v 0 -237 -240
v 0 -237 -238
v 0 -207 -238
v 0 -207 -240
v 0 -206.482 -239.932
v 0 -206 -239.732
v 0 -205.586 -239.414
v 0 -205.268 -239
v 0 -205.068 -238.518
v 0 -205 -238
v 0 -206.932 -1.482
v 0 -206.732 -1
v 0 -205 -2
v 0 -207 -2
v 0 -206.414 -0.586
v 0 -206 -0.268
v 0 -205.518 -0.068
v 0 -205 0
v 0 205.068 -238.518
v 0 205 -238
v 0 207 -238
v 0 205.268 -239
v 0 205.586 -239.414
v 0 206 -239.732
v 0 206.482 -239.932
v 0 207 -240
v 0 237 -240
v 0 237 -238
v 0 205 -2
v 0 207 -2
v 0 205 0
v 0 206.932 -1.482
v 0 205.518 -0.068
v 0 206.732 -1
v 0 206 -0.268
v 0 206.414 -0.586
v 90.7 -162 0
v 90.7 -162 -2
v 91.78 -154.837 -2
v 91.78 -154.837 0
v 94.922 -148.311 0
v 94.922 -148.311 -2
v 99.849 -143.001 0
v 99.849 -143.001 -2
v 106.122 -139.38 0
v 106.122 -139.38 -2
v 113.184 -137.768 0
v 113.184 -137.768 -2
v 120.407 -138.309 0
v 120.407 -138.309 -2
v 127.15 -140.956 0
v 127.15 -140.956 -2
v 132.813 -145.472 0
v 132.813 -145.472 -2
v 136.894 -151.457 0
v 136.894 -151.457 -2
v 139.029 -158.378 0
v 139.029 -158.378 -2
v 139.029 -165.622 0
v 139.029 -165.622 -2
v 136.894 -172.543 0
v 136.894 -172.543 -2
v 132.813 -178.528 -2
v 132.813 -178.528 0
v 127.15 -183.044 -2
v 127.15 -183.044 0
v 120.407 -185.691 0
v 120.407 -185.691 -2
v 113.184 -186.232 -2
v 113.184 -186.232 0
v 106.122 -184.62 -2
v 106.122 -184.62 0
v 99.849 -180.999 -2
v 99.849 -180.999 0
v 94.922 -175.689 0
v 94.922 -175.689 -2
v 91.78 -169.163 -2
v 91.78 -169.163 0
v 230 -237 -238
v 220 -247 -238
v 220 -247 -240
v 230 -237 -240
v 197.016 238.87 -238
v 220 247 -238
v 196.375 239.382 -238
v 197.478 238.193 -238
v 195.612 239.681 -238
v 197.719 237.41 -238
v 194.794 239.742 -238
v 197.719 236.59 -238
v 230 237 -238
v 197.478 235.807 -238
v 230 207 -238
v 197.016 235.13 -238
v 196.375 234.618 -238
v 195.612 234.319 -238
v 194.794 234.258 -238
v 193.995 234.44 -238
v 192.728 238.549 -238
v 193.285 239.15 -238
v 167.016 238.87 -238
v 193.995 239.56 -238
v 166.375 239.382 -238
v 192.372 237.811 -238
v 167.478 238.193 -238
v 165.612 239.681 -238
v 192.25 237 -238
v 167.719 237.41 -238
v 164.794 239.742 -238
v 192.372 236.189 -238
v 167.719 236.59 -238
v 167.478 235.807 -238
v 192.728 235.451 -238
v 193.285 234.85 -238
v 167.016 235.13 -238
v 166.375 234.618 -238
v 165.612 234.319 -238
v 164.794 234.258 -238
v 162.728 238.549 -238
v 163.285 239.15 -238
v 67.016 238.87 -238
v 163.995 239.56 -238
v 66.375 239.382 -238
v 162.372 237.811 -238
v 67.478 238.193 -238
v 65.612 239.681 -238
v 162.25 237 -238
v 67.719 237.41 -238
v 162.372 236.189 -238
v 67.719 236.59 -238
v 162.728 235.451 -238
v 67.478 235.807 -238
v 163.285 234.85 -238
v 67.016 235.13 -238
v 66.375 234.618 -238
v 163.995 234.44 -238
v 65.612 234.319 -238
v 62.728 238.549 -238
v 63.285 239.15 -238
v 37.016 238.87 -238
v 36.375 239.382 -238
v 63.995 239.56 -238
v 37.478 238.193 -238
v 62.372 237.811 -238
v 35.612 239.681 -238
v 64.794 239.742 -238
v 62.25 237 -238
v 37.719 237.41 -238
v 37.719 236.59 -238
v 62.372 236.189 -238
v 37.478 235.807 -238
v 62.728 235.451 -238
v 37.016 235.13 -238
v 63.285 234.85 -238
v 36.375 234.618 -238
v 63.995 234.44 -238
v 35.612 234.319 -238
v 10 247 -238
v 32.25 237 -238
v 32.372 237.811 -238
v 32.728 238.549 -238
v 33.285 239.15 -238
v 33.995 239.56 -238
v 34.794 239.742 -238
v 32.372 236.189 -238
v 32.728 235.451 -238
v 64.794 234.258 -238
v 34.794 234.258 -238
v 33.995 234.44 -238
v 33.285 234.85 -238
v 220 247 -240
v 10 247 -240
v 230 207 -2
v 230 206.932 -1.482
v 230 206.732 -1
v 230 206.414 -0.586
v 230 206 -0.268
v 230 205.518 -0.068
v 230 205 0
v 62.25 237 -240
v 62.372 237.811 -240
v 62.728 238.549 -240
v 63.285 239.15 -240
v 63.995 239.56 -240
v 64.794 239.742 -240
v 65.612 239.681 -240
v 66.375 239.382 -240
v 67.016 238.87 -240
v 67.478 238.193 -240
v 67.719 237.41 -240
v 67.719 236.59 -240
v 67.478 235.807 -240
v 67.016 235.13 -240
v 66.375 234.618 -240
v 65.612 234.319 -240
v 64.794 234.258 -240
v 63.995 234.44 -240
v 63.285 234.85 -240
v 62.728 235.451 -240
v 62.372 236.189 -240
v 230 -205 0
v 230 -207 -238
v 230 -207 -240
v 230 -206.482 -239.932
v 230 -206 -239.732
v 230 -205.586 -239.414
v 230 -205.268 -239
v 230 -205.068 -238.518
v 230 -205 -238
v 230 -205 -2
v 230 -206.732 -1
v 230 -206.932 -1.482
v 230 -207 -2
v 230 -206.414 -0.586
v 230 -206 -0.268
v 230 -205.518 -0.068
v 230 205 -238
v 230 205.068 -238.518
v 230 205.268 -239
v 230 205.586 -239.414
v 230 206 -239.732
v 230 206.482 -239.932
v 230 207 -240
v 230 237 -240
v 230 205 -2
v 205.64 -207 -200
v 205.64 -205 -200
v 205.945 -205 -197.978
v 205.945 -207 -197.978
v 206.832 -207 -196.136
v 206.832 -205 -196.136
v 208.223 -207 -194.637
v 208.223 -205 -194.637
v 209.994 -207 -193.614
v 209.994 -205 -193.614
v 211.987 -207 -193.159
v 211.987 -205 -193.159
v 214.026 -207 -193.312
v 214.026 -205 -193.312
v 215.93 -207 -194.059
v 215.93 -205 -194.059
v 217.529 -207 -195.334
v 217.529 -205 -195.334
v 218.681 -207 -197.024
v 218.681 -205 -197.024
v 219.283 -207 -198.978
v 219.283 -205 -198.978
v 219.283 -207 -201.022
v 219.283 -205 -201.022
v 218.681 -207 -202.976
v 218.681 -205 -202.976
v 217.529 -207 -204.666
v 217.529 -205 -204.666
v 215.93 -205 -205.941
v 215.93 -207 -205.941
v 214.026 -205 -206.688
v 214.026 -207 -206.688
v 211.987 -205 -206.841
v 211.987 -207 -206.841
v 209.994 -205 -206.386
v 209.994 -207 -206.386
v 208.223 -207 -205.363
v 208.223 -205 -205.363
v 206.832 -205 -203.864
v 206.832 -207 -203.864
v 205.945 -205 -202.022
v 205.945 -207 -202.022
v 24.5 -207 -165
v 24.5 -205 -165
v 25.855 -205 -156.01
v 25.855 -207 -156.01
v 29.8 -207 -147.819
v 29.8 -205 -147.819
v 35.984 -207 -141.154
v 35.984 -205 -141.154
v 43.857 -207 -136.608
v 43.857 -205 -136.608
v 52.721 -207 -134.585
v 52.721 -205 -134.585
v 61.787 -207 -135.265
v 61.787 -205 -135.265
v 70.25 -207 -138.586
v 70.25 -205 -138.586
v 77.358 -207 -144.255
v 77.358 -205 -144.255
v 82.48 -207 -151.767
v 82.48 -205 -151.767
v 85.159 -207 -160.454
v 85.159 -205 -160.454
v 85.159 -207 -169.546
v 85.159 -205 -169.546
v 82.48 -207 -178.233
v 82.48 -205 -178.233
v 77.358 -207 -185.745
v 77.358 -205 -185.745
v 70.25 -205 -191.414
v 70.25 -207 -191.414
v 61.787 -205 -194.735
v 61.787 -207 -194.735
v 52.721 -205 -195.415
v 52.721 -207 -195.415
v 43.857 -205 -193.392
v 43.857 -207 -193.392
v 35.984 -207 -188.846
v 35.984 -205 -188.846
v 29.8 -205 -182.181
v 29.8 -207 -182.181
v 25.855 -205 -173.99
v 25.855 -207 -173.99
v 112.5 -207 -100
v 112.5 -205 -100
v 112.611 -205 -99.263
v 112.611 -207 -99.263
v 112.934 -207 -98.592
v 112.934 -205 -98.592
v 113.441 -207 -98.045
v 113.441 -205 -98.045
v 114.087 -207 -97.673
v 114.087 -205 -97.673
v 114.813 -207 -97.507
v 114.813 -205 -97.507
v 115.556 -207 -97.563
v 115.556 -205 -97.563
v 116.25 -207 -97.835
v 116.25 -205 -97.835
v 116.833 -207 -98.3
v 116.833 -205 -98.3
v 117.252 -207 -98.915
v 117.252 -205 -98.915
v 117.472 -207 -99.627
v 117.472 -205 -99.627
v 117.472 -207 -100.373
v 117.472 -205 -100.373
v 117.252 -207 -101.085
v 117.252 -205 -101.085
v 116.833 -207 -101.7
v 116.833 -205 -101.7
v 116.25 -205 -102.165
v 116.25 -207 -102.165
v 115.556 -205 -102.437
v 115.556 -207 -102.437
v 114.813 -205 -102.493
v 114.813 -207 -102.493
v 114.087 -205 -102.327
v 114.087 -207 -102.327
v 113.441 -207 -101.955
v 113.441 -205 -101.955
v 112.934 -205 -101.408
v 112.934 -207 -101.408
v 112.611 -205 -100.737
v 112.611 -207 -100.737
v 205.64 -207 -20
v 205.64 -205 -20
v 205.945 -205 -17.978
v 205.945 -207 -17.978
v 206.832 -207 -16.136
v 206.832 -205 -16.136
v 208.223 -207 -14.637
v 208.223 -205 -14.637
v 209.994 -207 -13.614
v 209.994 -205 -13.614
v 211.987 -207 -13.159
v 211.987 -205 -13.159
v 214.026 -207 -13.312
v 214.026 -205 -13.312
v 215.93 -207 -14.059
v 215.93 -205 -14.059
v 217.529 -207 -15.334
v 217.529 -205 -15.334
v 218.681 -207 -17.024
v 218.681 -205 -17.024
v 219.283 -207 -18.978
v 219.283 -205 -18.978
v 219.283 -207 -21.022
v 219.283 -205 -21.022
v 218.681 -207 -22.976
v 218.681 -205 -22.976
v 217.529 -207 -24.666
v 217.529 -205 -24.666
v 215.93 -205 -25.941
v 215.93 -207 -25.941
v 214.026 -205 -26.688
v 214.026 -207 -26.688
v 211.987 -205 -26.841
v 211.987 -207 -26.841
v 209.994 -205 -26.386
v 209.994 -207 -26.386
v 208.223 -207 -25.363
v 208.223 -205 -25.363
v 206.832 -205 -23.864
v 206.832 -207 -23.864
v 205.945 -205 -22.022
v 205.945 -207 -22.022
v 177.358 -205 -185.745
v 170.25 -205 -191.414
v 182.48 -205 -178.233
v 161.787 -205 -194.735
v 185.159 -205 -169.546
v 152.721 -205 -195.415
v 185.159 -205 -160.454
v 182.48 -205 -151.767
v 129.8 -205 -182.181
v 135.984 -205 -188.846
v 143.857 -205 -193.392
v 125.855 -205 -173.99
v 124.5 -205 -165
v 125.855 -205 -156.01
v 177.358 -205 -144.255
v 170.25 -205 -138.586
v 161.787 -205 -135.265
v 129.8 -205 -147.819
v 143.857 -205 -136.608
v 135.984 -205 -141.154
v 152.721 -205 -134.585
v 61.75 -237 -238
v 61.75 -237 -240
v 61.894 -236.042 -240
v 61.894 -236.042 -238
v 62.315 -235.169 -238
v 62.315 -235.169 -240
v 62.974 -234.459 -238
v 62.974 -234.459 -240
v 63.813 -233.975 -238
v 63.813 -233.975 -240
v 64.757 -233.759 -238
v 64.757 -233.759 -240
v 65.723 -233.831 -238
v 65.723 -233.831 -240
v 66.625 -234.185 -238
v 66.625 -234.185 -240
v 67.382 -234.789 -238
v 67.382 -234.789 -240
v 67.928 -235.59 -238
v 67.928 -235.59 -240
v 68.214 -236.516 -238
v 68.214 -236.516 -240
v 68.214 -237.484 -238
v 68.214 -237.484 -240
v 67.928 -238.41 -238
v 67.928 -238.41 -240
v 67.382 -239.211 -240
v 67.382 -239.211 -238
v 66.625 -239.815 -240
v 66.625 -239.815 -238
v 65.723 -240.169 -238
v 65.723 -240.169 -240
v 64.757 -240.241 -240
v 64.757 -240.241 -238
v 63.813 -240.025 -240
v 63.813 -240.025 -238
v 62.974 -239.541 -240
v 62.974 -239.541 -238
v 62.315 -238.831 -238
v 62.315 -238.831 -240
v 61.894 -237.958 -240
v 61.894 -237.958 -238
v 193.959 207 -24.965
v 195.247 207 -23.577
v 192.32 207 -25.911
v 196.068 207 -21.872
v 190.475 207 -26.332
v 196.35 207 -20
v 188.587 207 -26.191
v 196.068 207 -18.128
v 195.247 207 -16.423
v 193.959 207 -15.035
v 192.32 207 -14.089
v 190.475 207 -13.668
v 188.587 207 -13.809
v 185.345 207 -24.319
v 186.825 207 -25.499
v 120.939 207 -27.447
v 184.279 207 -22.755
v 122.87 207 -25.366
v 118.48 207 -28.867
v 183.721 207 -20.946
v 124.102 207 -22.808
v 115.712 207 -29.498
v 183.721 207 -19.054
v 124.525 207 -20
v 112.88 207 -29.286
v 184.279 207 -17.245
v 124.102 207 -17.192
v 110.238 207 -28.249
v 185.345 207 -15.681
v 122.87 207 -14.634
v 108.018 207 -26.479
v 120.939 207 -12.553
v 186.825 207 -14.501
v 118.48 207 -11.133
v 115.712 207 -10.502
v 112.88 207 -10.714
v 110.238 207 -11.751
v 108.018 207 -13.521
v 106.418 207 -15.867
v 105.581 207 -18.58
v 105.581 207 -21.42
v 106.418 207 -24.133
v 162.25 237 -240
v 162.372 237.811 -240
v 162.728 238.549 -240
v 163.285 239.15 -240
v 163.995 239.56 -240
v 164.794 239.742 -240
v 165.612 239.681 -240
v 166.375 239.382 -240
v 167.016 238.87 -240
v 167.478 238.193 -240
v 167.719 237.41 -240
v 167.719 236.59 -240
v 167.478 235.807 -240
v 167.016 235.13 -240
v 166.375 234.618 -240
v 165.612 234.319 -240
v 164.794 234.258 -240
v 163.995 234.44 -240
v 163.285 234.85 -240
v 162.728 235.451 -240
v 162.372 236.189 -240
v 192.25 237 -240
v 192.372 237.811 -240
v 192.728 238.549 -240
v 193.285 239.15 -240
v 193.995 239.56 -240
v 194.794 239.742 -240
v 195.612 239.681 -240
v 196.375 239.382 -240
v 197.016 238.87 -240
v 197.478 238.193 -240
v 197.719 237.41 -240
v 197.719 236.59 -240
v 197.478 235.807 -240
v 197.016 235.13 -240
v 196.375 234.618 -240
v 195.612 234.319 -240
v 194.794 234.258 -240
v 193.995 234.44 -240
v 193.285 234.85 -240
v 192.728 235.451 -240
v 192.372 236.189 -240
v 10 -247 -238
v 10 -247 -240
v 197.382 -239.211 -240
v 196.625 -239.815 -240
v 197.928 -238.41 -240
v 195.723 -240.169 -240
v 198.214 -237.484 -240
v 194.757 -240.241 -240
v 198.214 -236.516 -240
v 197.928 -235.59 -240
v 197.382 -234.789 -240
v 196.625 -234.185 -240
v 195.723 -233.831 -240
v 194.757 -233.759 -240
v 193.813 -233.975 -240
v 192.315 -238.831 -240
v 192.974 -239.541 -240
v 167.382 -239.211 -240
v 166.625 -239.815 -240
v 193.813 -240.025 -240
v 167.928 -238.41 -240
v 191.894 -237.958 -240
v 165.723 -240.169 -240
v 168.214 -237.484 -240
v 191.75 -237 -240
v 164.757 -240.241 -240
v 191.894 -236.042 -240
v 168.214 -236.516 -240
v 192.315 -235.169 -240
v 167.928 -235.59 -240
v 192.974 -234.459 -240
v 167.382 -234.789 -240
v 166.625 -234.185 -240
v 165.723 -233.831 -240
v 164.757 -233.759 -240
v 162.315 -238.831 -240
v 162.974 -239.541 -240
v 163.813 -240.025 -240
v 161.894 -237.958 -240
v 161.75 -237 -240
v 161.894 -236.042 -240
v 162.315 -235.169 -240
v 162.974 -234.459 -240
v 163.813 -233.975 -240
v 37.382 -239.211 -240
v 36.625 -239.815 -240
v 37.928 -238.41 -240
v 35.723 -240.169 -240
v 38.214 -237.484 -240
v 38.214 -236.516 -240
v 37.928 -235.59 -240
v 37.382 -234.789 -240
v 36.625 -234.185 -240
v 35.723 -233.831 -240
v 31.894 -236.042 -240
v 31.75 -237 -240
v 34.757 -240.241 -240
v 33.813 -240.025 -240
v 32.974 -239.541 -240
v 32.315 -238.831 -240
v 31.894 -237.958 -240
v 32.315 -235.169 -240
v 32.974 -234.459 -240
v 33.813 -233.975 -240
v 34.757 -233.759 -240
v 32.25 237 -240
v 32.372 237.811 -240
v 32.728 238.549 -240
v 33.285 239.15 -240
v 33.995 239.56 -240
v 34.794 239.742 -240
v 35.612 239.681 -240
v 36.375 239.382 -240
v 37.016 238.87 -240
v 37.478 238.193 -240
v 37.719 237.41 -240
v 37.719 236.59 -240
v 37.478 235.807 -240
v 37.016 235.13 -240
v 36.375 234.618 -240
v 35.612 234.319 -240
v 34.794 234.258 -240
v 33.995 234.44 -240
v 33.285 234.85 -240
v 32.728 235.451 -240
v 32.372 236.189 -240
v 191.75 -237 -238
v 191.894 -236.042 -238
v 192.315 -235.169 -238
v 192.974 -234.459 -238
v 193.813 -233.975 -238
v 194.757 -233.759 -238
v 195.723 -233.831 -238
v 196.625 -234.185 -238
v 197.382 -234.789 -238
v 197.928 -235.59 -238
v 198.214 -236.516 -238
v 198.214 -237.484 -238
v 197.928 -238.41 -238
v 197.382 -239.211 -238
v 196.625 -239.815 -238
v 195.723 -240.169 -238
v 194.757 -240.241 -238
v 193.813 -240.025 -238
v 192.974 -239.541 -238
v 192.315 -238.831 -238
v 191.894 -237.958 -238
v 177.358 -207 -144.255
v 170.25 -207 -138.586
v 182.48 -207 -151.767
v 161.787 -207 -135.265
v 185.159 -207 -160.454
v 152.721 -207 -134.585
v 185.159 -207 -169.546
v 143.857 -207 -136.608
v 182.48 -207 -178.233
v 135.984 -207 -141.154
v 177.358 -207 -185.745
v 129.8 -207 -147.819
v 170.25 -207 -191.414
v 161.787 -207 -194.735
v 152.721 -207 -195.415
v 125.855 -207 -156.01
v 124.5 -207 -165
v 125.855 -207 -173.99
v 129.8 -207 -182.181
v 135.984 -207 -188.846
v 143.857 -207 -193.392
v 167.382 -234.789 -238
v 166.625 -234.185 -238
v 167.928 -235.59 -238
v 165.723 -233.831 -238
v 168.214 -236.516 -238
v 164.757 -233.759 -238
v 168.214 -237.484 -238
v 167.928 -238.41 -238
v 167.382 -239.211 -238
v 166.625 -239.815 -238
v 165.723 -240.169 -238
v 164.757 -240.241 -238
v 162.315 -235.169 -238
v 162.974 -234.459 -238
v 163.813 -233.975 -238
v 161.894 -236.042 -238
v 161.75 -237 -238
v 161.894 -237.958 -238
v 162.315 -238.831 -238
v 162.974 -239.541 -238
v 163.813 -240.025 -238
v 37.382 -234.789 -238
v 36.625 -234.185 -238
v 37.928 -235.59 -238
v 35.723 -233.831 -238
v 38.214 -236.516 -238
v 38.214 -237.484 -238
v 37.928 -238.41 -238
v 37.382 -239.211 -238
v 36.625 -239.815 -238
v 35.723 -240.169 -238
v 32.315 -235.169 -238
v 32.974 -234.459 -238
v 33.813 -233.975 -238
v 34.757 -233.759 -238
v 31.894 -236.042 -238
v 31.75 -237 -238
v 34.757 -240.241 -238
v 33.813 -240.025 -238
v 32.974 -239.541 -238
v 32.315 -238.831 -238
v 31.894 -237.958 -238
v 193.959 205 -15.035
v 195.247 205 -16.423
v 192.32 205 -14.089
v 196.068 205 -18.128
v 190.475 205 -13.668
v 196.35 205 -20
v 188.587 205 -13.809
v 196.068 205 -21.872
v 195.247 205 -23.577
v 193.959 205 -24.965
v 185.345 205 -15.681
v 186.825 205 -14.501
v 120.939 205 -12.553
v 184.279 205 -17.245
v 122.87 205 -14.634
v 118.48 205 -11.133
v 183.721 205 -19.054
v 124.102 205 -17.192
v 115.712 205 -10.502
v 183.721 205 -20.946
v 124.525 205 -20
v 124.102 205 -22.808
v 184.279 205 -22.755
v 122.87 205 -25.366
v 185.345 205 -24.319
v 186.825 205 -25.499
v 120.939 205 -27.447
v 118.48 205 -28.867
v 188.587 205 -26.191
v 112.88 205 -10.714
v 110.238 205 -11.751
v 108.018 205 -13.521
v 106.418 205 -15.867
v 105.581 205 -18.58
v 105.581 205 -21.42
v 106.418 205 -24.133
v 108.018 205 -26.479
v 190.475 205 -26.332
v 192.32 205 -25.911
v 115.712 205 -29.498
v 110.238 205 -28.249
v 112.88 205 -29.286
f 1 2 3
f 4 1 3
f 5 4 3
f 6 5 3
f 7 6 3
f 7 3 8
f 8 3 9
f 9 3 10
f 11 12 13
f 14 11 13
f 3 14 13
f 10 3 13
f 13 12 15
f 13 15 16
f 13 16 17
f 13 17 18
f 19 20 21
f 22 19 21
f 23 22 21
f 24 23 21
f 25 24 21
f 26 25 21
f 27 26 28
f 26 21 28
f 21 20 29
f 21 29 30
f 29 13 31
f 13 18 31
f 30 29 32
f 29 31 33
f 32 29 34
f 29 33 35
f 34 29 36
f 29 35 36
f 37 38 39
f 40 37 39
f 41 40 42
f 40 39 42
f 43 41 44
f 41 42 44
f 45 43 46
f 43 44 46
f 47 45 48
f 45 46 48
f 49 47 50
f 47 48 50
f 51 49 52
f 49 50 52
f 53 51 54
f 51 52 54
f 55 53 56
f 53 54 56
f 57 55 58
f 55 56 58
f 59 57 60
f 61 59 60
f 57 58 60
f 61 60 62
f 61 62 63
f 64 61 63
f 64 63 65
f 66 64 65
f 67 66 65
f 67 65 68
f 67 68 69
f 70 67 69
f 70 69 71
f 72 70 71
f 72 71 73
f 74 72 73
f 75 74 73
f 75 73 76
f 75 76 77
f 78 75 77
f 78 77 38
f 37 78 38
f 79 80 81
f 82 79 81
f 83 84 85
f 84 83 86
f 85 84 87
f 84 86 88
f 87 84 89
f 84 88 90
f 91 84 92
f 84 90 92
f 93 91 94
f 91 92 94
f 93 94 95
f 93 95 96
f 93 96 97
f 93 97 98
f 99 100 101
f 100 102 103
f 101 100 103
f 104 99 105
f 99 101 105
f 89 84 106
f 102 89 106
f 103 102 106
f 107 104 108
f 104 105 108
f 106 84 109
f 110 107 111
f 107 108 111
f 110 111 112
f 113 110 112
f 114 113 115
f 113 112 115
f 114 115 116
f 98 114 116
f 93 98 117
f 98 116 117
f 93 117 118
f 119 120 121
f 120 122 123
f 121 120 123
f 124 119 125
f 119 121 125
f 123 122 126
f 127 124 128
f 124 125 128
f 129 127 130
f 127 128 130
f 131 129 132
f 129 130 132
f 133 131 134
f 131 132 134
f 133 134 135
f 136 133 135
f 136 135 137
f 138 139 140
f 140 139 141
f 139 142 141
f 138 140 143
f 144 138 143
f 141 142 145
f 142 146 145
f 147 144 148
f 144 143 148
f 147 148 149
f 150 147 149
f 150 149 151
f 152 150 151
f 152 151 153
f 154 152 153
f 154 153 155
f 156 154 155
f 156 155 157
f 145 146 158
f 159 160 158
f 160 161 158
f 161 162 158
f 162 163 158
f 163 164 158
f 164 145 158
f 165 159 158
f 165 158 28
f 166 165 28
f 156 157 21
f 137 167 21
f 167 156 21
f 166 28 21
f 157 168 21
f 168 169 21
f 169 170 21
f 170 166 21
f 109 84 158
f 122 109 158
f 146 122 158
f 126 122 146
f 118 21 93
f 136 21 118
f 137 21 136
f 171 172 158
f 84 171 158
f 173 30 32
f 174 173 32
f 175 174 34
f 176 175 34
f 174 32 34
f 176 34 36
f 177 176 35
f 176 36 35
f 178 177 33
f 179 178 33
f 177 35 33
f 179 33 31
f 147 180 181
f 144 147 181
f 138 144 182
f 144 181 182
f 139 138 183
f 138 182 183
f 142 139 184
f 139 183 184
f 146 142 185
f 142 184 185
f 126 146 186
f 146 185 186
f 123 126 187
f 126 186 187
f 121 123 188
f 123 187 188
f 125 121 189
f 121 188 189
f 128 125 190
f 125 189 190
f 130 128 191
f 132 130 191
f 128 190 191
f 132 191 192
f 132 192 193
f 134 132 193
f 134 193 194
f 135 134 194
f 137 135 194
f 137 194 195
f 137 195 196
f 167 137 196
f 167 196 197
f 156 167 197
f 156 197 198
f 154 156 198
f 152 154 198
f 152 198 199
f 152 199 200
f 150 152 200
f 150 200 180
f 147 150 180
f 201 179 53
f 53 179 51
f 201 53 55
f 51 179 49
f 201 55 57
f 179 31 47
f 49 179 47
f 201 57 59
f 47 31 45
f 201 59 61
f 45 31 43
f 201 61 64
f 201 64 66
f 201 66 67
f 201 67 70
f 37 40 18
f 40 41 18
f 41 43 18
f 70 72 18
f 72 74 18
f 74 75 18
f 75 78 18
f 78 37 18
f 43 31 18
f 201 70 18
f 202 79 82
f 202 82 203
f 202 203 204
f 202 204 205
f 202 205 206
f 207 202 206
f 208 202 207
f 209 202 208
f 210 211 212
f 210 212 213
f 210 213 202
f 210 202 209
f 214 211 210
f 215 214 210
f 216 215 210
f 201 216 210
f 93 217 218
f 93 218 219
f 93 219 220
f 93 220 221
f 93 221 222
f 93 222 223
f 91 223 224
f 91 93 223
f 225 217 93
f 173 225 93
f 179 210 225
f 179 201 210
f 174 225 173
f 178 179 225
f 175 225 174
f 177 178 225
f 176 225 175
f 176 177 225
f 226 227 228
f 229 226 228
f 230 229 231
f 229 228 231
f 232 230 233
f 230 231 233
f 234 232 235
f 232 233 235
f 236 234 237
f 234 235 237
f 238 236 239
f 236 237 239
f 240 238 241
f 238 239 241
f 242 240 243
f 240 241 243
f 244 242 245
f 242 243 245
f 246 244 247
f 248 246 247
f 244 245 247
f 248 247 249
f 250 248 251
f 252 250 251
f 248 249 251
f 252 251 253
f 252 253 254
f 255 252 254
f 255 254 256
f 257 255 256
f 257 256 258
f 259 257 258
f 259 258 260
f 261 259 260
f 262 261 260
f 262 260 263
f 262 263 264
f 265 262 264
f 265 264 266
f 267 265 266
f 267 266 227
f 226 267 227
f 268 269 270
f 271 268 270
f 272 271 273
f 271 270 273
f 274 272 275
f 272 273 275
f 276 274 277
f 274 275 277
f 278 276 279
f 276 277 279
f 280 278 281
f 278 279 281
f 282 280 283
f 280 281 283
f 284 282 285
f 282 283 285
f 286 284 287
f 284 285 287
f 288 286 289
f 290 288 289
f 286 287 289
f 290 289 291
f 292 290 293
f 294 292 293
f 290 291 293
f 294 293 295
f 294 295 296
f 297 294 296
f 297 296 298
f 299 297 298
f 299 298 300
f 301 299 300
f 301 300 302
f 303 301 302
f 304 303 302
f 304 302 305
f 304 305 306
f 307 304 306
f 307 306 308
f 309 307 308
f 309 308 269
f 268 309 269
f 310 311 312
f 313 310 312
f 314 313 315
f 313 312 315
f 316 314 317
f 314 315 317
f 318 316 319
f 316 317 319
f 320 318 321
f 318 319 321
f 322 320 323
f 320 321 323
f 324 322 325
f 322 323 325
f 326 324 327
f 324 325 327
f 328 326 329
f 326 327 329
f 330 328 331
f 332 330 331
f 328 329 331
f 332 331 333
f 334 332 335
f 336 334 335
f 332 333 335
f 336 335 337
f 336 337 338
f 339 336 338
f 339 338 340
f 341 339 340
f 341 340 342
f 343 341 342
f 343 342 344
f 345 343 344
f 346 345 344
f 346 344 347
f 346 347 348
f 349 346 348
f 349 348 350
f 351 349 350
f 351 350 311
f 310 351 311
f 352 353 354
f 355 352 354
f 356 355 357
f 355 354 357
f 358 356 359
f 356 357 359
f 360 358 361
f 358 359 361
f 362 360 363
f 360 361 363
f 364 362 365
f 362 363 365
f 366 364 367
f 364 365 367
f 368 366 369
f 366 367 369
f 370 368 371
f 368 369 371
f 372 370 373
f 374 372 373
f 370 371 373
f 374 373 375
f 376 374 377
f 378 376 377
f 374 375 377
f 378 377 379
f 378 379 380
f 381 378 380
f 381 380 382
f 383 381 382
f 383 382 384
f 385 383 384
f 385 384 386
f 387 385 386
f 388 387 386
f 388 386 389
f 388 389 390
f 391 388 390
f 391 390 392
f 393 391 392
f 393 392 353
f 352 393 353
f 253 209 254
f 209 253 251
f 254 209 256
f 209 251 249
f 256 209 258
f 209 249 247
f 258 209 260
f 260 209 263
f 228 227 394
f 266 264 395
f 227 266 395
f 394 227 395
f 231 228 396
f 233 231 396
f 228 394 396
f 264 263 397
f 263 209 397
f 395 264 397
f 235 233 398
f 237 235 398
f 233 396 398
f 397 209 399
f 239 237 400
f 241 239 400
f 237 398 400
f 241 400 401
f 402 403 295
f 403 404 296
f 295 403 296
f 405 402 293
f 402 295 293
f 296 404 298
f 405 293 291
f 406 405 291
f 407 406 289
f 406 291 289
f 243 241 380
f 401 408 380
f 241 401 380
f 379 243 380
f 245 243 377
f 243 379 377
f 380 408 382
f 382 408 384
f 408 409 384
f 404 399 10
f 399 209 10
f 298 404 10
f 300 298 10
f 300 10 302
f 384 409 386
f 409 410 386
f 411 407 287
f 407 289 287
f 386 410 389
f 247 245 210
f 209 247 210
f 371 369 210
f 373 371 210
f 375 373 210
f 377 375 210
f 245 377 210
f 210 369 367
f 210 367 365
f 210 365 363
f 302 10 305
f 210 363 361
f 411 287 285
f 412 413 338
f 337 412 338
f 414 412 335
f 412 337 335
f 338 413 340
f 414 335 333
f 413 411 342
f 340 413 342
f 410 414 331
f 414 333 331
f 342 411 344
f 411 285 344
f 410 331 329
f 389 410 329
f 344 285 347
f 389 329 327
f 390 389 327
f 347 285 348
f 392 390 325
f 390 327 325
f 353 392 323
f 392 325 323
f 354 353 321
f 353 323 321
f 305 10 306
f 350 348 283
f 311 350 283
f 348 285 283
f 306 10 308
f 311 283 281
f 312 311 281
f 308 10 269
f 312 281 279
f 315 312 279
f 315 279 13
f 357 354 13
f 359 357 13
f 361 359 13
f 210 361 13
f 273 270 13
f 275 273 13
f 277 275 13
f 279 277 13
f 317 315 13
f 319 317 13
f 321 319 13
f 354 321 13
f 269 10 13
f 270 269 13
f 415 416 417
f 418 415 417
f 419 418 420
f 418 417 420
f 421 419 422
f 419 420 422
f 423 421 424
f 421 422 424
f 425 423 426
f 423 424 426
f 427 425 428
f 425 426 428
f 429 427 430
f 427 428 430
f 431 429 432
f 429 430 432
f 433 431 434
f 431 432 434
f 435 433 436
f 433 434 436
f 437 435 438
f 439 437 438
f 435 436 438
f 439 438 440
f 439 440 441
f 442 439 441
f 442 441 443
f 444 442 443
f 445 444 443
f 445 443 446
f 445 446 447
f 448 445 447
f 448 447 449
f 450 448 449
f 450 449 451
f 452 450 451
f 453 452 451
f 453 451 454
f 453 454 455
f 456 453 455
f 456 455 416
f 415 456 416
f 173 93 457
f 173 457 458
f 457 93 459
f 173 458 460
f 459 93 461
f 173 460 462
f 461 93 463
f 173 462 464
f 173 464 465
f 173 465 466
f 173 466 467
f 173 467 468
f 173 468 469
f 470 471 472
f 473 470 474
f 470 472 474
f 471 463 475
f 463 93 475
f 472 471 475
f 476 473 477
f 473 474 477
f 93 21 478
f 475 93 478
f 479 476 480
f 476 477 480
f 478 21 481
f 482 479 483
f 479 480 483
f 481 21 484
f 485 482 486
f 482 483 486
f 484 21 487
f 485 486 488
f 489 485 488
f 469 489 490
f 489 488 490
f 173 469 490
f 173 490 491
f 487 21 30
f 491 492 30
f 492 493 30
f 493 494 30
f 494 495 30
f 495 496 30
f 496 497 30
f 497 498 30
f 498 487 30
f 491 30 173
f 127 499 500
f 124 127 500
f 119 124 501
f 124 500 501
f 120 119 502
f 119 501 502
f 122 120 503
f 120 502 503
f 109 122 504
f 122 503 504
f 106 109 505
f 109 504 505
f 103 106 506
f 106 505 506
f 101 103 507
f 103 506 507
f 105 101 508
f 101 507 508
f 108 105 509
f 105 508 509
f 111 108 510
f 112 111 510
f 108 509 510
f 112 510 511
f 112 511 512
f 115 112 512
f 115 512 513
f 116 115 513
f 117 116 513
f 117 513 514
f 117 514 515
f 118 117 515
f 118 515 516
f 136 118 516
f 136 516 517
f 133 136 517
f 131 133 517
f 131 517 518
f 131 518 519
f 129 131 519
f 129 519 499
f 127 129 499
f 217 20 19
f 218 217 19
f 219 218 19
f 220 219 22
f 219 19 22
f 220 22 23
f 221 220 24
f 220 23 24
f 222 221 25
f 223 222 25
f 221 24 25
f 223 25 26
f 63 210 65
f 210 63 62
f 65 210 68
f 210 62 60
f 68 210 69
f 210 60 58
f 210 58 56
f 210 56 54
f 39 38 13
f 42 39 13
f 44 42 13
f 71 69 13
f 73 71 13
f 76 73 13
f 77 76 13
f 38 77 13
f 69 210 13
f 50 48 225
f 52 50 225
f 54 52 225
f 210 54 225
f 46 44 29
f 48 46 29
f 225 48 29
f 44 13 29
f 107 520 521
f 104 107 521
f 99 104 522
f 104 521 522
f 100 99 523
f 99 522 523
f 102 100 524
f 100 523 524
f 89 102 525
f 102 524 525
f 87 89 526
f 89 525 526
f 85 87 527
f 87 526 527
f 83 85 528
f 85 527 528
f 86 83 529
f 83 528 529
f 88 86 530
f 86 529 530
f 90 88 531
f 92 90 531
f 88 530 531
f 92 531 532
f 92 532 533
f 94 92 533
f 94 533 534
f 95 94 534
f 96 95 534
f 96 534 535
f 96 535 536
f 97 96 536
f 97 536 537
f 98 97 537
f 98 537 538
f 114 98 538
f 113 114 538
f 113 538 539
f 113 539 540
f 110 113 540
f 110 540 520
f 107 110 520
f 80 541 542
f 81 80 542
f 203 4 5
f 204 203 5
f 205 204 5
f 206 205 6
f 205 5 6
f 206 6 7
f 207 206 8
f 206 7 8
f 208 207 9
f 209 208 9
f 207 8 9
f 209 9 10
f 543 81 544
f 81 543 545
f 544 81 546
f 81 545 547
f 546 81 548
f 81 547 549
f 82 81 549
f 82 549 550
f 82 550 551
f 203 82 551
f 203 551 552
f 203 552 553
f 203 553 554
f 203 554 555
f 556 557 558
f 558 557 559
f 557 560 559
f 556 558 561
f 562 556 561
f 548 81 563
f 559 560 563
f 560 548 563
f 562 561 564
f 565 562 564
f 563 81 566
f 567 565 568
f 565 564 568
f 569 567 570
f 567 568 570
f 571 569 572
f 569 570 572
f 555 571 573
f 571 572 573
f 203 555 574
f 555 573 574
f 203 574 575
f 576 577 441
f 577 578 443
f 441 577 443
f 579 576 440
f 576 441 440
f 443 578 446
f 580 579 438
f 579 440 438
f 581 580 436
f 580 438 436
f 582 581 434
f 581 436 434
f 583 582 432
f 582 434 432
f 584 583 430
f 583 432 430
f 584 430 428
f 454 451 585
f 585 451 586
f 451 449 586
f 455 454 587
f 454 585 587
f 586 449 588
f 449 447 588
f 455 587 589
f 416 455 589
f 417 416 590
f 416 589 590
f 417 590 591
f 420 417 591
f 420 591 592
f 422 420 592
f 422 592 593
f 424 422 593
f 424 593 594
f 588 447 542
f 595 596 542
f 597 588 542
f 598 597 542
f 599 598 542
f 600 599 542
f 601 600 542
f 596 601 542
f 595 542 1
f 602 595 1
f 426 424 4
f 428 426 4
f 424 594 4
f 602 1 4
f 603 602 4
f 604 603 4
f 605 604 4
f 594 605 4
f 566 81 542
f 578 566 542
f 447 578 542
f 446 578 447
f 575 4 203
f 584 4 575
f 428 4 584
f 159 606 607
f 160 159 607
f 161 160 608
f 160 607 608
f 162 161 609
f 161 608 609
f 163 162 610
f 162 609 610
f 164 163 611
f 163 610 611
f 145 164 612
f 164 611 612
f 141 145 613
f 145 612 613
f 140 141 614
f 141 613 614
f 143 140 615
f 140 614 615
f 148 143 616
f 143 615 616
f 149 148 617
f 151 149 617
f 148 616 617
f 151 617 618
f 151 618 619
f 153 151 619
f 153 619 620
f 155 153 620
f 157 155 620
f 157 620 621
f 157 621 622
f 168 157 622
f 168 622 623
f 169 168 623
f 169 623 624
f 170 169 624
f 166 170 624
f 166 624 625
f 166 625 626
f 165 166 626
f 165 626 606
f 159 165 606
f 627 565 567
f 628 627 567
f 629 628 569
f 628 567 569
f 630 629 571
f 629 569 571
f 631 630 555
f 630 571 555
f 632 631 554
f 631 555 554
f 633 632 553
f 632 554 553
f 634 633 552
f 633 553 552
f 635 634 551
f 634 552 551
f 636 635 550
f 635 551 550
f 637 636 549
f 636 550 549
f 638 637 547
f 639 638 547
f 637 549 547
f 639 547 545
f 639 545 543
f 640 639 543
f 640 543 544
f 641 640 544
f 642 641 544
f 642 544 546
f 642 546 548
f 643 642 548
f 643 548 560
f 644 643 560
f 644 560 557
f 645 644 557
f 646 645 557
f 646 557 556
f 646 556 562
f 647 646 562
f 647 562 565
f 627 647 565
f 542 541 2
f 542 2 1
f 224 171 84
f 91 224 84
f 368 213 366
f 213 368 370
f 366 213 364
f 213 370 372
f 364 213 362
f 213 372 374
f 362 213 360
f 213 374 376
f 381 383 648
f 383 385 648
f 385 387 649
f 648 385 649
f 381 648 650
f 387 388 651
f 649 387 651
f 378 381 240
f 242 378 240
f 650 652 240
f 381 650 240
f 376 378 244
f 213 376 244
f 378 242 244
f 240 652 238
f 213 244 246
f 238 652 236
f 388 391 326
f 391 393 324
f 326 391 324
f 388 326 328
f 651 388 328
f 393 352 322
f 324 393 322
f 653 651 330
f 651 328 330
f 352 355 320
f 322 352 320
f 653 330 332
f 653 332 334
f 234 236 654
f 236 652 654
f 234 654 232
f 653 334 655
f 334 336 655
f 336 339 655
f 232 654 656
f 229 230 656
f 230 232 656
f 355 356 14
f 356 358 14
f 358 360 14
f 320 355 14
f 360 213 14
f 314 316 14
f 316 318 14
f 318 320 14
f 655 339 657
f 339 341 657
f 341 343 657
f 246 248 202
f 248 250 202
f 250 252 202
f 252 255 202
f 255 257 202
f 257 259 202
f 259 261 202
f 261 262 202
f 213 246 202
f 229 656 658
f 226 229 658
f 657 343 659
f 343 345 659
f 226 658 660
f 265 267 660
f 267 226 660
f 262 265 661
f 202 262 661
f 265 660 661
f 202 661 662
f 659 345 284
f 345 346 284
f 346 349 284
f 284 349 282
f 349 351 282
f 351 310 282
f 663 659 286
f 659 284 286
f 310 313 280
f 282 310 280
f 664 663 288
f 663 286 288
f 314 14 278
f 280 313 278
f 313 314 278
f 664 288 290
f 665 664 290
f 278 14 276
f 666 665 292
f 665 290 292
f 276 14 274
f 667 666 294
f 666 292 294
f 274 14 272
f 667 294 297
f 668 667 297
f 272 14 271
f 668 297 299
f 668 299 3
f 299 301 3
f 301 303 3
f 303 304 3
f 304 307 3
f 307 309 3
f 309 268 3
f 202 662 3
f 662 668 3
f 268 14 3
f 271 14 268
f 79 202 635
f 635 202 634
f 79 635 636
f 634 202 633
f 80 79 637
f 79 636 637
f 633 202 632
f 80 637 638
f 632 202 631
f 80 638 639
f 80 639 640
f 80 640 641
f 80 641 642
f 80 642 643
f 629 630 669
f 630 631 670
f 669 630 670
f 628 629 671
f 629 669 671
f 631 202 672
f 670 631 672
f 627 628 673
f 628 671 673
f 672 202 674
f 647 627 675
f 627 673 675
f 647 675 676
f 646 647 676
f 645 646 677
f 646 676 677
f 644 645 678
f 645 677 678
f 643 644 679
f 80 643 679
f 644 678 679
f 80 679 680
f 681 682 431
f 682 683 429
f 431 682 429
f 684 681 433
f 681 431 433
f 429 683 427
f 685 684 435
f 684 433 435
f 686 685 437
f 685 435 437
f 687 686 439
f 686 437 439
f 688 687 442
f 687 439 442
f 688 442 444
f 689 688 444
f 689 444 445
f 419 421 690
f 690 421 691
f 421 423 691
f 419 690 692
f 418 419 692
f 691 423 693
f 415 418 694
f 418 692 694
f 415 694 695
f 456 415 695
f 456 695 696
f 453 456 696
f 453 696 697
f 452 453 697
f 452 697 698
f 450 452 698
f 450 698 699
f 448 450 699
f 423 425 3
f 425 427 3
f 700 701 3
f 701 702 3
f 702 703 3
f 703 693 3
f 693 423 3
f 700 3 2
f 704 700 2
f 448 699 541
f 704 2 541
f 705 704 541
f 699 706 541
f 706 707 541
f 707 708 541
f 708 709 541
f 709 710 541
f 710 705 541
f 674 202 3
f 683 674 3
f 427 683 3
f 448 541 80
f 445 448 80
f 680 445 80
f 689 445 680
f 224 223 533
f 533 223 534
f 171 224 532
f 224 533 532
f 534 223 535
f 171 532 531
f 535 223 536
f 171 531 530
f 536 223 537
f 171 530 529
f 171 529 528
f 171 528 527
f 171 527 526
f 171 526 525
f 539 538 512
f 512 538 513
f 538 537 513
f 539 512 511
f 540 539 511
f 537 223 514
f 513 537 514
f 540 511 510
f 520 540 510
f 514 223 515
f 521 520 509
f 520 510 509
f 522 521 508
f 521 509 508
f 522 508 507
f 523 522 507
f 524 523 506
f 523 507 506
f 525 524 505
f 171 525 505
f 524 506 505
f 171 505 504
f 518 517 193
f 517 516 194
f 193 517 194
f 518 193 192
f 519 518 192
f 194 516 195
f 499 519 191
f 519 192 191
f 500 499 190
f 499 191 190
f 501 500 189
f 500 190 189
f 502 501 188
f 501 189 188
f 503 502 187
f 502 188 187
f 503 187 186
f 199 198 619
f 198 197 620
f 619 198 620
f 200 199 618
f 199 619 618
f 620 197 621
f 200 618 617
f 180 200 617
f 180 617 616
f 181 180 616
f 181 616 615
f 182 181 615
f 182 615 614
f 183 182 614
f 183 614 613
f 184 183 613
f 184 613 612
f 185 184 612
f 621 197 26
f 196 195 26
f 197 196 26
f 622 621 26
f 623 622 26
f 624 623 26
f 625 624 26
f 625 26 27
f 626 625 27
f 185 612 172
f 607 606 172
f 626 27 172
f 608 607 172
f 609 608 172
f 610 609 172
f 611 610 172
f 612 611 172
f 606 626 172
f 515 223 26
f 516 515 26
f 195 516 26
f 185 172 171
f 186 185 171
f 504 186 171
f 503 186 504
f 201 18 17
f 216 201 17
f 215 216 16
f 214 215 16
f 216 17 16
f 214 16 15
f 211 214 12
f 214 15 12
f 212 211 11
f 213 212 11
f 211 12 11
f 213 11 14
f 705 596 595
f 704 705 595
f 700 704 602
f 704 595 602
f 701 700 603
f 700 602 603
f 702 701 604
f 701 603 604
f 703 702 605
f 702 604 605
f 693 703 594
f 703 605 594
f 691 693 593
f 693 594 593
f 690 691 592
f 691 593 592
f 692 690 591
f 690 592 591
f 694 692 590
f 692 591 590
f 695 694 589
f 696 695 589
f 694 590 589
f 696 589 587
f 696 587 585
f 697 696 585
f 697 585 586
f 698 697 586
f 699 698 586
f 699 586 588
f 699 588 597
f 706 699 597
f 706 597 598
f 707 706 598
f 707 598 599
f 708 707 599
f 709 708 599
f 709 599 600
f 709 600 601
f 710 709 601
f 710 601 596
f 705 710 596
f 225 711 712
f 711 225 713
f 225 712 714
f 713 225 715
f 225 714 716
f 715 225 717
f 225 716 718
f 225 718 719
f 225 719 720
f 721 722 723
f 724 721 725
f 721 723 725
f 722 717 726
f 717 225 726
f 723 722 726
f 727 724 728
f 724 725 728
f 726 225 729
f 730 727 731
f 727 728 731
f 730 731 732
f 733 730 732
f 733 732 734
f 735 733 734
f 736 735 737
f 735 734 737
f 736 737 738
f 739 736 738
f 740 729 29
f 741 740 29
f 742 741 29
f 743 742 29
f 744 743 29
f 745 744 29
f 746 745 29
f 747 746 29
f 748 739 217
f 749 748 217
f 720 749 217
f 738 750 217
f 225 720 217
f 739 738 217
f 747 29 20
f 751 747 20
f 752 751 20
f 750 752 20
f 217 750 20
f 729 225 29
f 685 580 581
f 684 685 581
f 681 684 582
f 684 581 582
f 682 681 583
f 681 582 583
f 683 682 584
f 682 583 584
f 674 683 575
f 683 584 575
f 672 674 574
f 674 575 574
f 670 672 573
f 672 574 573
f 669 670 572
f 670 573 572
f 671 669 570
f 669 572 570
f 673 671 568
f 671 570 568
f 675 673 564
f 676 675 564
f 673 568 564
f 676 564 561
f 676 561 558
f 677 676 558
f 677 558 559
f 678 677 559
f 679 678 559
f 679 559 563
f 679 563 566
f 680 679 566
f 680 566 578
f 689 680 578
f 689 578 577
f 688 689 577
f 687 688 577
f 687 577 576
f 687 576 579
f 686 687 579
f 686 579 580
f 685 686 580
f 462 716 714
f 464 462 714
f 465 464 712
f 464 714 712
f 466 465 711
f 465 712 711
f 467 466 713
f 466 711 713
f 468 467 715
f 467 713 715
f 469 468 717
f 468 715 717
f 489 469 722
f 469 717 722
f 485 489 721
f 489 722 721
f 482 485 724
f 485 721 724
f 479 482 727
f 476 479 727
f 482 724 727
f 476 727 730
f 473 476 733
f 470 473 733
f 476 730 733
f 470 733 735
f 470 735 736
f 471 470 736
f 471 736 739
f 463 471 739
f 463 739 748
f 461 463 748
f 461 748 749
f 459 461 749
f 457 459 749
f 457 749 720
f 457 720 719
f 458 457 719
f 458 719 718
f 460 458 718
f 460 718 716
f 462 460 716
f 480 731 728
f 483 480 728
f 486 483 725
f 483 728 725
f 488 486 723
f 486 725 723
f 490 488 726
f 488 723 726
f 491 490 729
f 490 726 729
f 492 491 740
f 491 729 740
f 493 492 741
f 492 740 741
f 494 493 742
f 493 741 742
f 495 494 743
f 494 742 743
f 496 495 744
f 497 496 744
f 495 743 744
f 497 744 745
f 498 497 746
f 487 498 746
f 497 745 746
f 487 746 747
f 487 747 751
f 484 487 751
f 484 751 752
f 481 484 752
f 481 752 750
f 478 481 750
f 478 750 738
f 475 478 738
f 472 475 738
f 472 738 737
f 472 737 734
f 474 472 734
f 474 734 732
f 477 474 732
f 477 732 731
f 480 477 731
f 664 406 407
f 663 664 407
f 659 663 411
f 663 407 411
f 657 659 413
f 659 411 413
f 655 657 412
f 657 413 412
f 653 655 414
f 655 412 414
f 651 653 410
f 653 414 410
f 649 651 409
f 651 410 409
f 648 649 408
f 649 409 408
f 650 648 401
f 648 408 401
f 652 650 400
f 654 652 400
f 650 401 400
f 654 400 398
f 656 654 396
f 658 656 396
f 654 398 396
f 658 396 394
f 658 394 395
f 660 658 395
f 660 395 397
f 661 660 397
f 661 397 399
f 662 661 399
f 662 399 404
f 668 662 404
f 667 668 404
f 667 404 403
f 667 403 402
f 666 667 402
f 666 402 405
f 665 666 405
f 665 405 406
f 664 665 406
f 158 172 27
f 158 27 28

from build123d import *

# Parameters (mm, degrees)
F1_DEPTH  = 230
F3_D      = 48.6
F5_D      = 6.5
F6_D      = 5.5
F7_SIZE   = 10
F9_D      = 61
F9_DEPTH  = 12
F10_D     = 5
F10_DEPTH = 5
F11_D     = 13.72
F11_DEPTH = 5
F13_D     = 12.7
F13_DEPTH = 5
F14_D     = 19.05
F14_DEPTH = 5


with BuildPart() as f1:
    # F0 (on Right) → F1 (new body)
    with BuildSketch(Plane.YZ):
        with BuildLine():
            Line((205, 0), (-205, 0))
            ThreePointArc((-205, 0), (-206.414214, -0.585786), (-207, -2))
            Line((-207, -2), (-207, -238))
            Line((-207, -238), (-247, -238))
            Line((-247, -238), (-247, -240))
            Line((-247, -240), (-207, -240))
            ThreePointArc((-207, -240), (-205.585786, -239.414214), (-205, -238))
            Line((-205, -238), (-205, -2))
            Line((-205, -2), (205, -2))
            Line((205, -2), (205, -238))
            ThreePointArc((205, -238), (205.585786, -239.414214), (207, -240))
            Line((207, -240), (247, -240))
            Line((247, -240), (247, -238))
            Line((247, -238), (207, -238))
            Line((207, -238), (207, -2))
            ThreePointArc((207, -2), (206.414214, -0.585786), (205, 0))
        make_face()
    extrude(amount=F1_DEPTH)

    # F3 (through all)
    with Locations(Plane.XY):
        with Locations((115, -162)):
            Hole(F3_D / 2)

    # F5 (through all)
    with Locations(Plane.XY.offset(-238)):
        with Locations((35, -237), (65, -237), (165, -237), (195, -237)):
            Hole(F5_D / 2)

    # F6 (through all)
    with Locations(Plane.XY.offset(-238)):
        with Locations((35, 237), (65, 237), (165, 237), (195, 237)):
            Hole(F6_D / 2)

    # F7
    f7_edges = [f1.edges().sort_by_distance(p)[0] for p in [
        (0, -247, -239),
        (230, -247, -239),
        (230, 247, -239),
        (0, 247, -239),
    ]]
    chamfer(f7_edges, length=F7_SIZE)

    # F9
    with Locations(Plane.XZ.offset(207)):
        with Locations((55, -165), (155, -165)):
            Hole(F9_D / 2, depth=F9_DEPTH)

    # F10
    with Locations(Plane.XZ.offset(207)):
        with Locations((115, -100)):
            Hole(F10_D / 2, depth=F10_DEPTH)

    # F11
    with Locations(Plane.XZ.offset(207)):
        with Locations((212.5, -20), (212.5, -200)):
            Hole(F11_D / 2, depth=F11_DEPTH)

    # F13
    with Locations(Plane(origin=(0, 207, 0), x_dir=(-1, 0, 0), z_dir=(0, 1, 0))):
        with Locations((-190, -20)):
            Hole(F13_D / 2, depth=F13_DEPTH)

    # F14
    with Locations(Plane(origin=(0, 207, 0), x_dir=(-1, 0, 0), z_dir=(0, 1, 0))):
        with Locations((-115, -20)):
            Hole(F14_D / 2, depth=F14_DEPTH)


solid = f1.part
